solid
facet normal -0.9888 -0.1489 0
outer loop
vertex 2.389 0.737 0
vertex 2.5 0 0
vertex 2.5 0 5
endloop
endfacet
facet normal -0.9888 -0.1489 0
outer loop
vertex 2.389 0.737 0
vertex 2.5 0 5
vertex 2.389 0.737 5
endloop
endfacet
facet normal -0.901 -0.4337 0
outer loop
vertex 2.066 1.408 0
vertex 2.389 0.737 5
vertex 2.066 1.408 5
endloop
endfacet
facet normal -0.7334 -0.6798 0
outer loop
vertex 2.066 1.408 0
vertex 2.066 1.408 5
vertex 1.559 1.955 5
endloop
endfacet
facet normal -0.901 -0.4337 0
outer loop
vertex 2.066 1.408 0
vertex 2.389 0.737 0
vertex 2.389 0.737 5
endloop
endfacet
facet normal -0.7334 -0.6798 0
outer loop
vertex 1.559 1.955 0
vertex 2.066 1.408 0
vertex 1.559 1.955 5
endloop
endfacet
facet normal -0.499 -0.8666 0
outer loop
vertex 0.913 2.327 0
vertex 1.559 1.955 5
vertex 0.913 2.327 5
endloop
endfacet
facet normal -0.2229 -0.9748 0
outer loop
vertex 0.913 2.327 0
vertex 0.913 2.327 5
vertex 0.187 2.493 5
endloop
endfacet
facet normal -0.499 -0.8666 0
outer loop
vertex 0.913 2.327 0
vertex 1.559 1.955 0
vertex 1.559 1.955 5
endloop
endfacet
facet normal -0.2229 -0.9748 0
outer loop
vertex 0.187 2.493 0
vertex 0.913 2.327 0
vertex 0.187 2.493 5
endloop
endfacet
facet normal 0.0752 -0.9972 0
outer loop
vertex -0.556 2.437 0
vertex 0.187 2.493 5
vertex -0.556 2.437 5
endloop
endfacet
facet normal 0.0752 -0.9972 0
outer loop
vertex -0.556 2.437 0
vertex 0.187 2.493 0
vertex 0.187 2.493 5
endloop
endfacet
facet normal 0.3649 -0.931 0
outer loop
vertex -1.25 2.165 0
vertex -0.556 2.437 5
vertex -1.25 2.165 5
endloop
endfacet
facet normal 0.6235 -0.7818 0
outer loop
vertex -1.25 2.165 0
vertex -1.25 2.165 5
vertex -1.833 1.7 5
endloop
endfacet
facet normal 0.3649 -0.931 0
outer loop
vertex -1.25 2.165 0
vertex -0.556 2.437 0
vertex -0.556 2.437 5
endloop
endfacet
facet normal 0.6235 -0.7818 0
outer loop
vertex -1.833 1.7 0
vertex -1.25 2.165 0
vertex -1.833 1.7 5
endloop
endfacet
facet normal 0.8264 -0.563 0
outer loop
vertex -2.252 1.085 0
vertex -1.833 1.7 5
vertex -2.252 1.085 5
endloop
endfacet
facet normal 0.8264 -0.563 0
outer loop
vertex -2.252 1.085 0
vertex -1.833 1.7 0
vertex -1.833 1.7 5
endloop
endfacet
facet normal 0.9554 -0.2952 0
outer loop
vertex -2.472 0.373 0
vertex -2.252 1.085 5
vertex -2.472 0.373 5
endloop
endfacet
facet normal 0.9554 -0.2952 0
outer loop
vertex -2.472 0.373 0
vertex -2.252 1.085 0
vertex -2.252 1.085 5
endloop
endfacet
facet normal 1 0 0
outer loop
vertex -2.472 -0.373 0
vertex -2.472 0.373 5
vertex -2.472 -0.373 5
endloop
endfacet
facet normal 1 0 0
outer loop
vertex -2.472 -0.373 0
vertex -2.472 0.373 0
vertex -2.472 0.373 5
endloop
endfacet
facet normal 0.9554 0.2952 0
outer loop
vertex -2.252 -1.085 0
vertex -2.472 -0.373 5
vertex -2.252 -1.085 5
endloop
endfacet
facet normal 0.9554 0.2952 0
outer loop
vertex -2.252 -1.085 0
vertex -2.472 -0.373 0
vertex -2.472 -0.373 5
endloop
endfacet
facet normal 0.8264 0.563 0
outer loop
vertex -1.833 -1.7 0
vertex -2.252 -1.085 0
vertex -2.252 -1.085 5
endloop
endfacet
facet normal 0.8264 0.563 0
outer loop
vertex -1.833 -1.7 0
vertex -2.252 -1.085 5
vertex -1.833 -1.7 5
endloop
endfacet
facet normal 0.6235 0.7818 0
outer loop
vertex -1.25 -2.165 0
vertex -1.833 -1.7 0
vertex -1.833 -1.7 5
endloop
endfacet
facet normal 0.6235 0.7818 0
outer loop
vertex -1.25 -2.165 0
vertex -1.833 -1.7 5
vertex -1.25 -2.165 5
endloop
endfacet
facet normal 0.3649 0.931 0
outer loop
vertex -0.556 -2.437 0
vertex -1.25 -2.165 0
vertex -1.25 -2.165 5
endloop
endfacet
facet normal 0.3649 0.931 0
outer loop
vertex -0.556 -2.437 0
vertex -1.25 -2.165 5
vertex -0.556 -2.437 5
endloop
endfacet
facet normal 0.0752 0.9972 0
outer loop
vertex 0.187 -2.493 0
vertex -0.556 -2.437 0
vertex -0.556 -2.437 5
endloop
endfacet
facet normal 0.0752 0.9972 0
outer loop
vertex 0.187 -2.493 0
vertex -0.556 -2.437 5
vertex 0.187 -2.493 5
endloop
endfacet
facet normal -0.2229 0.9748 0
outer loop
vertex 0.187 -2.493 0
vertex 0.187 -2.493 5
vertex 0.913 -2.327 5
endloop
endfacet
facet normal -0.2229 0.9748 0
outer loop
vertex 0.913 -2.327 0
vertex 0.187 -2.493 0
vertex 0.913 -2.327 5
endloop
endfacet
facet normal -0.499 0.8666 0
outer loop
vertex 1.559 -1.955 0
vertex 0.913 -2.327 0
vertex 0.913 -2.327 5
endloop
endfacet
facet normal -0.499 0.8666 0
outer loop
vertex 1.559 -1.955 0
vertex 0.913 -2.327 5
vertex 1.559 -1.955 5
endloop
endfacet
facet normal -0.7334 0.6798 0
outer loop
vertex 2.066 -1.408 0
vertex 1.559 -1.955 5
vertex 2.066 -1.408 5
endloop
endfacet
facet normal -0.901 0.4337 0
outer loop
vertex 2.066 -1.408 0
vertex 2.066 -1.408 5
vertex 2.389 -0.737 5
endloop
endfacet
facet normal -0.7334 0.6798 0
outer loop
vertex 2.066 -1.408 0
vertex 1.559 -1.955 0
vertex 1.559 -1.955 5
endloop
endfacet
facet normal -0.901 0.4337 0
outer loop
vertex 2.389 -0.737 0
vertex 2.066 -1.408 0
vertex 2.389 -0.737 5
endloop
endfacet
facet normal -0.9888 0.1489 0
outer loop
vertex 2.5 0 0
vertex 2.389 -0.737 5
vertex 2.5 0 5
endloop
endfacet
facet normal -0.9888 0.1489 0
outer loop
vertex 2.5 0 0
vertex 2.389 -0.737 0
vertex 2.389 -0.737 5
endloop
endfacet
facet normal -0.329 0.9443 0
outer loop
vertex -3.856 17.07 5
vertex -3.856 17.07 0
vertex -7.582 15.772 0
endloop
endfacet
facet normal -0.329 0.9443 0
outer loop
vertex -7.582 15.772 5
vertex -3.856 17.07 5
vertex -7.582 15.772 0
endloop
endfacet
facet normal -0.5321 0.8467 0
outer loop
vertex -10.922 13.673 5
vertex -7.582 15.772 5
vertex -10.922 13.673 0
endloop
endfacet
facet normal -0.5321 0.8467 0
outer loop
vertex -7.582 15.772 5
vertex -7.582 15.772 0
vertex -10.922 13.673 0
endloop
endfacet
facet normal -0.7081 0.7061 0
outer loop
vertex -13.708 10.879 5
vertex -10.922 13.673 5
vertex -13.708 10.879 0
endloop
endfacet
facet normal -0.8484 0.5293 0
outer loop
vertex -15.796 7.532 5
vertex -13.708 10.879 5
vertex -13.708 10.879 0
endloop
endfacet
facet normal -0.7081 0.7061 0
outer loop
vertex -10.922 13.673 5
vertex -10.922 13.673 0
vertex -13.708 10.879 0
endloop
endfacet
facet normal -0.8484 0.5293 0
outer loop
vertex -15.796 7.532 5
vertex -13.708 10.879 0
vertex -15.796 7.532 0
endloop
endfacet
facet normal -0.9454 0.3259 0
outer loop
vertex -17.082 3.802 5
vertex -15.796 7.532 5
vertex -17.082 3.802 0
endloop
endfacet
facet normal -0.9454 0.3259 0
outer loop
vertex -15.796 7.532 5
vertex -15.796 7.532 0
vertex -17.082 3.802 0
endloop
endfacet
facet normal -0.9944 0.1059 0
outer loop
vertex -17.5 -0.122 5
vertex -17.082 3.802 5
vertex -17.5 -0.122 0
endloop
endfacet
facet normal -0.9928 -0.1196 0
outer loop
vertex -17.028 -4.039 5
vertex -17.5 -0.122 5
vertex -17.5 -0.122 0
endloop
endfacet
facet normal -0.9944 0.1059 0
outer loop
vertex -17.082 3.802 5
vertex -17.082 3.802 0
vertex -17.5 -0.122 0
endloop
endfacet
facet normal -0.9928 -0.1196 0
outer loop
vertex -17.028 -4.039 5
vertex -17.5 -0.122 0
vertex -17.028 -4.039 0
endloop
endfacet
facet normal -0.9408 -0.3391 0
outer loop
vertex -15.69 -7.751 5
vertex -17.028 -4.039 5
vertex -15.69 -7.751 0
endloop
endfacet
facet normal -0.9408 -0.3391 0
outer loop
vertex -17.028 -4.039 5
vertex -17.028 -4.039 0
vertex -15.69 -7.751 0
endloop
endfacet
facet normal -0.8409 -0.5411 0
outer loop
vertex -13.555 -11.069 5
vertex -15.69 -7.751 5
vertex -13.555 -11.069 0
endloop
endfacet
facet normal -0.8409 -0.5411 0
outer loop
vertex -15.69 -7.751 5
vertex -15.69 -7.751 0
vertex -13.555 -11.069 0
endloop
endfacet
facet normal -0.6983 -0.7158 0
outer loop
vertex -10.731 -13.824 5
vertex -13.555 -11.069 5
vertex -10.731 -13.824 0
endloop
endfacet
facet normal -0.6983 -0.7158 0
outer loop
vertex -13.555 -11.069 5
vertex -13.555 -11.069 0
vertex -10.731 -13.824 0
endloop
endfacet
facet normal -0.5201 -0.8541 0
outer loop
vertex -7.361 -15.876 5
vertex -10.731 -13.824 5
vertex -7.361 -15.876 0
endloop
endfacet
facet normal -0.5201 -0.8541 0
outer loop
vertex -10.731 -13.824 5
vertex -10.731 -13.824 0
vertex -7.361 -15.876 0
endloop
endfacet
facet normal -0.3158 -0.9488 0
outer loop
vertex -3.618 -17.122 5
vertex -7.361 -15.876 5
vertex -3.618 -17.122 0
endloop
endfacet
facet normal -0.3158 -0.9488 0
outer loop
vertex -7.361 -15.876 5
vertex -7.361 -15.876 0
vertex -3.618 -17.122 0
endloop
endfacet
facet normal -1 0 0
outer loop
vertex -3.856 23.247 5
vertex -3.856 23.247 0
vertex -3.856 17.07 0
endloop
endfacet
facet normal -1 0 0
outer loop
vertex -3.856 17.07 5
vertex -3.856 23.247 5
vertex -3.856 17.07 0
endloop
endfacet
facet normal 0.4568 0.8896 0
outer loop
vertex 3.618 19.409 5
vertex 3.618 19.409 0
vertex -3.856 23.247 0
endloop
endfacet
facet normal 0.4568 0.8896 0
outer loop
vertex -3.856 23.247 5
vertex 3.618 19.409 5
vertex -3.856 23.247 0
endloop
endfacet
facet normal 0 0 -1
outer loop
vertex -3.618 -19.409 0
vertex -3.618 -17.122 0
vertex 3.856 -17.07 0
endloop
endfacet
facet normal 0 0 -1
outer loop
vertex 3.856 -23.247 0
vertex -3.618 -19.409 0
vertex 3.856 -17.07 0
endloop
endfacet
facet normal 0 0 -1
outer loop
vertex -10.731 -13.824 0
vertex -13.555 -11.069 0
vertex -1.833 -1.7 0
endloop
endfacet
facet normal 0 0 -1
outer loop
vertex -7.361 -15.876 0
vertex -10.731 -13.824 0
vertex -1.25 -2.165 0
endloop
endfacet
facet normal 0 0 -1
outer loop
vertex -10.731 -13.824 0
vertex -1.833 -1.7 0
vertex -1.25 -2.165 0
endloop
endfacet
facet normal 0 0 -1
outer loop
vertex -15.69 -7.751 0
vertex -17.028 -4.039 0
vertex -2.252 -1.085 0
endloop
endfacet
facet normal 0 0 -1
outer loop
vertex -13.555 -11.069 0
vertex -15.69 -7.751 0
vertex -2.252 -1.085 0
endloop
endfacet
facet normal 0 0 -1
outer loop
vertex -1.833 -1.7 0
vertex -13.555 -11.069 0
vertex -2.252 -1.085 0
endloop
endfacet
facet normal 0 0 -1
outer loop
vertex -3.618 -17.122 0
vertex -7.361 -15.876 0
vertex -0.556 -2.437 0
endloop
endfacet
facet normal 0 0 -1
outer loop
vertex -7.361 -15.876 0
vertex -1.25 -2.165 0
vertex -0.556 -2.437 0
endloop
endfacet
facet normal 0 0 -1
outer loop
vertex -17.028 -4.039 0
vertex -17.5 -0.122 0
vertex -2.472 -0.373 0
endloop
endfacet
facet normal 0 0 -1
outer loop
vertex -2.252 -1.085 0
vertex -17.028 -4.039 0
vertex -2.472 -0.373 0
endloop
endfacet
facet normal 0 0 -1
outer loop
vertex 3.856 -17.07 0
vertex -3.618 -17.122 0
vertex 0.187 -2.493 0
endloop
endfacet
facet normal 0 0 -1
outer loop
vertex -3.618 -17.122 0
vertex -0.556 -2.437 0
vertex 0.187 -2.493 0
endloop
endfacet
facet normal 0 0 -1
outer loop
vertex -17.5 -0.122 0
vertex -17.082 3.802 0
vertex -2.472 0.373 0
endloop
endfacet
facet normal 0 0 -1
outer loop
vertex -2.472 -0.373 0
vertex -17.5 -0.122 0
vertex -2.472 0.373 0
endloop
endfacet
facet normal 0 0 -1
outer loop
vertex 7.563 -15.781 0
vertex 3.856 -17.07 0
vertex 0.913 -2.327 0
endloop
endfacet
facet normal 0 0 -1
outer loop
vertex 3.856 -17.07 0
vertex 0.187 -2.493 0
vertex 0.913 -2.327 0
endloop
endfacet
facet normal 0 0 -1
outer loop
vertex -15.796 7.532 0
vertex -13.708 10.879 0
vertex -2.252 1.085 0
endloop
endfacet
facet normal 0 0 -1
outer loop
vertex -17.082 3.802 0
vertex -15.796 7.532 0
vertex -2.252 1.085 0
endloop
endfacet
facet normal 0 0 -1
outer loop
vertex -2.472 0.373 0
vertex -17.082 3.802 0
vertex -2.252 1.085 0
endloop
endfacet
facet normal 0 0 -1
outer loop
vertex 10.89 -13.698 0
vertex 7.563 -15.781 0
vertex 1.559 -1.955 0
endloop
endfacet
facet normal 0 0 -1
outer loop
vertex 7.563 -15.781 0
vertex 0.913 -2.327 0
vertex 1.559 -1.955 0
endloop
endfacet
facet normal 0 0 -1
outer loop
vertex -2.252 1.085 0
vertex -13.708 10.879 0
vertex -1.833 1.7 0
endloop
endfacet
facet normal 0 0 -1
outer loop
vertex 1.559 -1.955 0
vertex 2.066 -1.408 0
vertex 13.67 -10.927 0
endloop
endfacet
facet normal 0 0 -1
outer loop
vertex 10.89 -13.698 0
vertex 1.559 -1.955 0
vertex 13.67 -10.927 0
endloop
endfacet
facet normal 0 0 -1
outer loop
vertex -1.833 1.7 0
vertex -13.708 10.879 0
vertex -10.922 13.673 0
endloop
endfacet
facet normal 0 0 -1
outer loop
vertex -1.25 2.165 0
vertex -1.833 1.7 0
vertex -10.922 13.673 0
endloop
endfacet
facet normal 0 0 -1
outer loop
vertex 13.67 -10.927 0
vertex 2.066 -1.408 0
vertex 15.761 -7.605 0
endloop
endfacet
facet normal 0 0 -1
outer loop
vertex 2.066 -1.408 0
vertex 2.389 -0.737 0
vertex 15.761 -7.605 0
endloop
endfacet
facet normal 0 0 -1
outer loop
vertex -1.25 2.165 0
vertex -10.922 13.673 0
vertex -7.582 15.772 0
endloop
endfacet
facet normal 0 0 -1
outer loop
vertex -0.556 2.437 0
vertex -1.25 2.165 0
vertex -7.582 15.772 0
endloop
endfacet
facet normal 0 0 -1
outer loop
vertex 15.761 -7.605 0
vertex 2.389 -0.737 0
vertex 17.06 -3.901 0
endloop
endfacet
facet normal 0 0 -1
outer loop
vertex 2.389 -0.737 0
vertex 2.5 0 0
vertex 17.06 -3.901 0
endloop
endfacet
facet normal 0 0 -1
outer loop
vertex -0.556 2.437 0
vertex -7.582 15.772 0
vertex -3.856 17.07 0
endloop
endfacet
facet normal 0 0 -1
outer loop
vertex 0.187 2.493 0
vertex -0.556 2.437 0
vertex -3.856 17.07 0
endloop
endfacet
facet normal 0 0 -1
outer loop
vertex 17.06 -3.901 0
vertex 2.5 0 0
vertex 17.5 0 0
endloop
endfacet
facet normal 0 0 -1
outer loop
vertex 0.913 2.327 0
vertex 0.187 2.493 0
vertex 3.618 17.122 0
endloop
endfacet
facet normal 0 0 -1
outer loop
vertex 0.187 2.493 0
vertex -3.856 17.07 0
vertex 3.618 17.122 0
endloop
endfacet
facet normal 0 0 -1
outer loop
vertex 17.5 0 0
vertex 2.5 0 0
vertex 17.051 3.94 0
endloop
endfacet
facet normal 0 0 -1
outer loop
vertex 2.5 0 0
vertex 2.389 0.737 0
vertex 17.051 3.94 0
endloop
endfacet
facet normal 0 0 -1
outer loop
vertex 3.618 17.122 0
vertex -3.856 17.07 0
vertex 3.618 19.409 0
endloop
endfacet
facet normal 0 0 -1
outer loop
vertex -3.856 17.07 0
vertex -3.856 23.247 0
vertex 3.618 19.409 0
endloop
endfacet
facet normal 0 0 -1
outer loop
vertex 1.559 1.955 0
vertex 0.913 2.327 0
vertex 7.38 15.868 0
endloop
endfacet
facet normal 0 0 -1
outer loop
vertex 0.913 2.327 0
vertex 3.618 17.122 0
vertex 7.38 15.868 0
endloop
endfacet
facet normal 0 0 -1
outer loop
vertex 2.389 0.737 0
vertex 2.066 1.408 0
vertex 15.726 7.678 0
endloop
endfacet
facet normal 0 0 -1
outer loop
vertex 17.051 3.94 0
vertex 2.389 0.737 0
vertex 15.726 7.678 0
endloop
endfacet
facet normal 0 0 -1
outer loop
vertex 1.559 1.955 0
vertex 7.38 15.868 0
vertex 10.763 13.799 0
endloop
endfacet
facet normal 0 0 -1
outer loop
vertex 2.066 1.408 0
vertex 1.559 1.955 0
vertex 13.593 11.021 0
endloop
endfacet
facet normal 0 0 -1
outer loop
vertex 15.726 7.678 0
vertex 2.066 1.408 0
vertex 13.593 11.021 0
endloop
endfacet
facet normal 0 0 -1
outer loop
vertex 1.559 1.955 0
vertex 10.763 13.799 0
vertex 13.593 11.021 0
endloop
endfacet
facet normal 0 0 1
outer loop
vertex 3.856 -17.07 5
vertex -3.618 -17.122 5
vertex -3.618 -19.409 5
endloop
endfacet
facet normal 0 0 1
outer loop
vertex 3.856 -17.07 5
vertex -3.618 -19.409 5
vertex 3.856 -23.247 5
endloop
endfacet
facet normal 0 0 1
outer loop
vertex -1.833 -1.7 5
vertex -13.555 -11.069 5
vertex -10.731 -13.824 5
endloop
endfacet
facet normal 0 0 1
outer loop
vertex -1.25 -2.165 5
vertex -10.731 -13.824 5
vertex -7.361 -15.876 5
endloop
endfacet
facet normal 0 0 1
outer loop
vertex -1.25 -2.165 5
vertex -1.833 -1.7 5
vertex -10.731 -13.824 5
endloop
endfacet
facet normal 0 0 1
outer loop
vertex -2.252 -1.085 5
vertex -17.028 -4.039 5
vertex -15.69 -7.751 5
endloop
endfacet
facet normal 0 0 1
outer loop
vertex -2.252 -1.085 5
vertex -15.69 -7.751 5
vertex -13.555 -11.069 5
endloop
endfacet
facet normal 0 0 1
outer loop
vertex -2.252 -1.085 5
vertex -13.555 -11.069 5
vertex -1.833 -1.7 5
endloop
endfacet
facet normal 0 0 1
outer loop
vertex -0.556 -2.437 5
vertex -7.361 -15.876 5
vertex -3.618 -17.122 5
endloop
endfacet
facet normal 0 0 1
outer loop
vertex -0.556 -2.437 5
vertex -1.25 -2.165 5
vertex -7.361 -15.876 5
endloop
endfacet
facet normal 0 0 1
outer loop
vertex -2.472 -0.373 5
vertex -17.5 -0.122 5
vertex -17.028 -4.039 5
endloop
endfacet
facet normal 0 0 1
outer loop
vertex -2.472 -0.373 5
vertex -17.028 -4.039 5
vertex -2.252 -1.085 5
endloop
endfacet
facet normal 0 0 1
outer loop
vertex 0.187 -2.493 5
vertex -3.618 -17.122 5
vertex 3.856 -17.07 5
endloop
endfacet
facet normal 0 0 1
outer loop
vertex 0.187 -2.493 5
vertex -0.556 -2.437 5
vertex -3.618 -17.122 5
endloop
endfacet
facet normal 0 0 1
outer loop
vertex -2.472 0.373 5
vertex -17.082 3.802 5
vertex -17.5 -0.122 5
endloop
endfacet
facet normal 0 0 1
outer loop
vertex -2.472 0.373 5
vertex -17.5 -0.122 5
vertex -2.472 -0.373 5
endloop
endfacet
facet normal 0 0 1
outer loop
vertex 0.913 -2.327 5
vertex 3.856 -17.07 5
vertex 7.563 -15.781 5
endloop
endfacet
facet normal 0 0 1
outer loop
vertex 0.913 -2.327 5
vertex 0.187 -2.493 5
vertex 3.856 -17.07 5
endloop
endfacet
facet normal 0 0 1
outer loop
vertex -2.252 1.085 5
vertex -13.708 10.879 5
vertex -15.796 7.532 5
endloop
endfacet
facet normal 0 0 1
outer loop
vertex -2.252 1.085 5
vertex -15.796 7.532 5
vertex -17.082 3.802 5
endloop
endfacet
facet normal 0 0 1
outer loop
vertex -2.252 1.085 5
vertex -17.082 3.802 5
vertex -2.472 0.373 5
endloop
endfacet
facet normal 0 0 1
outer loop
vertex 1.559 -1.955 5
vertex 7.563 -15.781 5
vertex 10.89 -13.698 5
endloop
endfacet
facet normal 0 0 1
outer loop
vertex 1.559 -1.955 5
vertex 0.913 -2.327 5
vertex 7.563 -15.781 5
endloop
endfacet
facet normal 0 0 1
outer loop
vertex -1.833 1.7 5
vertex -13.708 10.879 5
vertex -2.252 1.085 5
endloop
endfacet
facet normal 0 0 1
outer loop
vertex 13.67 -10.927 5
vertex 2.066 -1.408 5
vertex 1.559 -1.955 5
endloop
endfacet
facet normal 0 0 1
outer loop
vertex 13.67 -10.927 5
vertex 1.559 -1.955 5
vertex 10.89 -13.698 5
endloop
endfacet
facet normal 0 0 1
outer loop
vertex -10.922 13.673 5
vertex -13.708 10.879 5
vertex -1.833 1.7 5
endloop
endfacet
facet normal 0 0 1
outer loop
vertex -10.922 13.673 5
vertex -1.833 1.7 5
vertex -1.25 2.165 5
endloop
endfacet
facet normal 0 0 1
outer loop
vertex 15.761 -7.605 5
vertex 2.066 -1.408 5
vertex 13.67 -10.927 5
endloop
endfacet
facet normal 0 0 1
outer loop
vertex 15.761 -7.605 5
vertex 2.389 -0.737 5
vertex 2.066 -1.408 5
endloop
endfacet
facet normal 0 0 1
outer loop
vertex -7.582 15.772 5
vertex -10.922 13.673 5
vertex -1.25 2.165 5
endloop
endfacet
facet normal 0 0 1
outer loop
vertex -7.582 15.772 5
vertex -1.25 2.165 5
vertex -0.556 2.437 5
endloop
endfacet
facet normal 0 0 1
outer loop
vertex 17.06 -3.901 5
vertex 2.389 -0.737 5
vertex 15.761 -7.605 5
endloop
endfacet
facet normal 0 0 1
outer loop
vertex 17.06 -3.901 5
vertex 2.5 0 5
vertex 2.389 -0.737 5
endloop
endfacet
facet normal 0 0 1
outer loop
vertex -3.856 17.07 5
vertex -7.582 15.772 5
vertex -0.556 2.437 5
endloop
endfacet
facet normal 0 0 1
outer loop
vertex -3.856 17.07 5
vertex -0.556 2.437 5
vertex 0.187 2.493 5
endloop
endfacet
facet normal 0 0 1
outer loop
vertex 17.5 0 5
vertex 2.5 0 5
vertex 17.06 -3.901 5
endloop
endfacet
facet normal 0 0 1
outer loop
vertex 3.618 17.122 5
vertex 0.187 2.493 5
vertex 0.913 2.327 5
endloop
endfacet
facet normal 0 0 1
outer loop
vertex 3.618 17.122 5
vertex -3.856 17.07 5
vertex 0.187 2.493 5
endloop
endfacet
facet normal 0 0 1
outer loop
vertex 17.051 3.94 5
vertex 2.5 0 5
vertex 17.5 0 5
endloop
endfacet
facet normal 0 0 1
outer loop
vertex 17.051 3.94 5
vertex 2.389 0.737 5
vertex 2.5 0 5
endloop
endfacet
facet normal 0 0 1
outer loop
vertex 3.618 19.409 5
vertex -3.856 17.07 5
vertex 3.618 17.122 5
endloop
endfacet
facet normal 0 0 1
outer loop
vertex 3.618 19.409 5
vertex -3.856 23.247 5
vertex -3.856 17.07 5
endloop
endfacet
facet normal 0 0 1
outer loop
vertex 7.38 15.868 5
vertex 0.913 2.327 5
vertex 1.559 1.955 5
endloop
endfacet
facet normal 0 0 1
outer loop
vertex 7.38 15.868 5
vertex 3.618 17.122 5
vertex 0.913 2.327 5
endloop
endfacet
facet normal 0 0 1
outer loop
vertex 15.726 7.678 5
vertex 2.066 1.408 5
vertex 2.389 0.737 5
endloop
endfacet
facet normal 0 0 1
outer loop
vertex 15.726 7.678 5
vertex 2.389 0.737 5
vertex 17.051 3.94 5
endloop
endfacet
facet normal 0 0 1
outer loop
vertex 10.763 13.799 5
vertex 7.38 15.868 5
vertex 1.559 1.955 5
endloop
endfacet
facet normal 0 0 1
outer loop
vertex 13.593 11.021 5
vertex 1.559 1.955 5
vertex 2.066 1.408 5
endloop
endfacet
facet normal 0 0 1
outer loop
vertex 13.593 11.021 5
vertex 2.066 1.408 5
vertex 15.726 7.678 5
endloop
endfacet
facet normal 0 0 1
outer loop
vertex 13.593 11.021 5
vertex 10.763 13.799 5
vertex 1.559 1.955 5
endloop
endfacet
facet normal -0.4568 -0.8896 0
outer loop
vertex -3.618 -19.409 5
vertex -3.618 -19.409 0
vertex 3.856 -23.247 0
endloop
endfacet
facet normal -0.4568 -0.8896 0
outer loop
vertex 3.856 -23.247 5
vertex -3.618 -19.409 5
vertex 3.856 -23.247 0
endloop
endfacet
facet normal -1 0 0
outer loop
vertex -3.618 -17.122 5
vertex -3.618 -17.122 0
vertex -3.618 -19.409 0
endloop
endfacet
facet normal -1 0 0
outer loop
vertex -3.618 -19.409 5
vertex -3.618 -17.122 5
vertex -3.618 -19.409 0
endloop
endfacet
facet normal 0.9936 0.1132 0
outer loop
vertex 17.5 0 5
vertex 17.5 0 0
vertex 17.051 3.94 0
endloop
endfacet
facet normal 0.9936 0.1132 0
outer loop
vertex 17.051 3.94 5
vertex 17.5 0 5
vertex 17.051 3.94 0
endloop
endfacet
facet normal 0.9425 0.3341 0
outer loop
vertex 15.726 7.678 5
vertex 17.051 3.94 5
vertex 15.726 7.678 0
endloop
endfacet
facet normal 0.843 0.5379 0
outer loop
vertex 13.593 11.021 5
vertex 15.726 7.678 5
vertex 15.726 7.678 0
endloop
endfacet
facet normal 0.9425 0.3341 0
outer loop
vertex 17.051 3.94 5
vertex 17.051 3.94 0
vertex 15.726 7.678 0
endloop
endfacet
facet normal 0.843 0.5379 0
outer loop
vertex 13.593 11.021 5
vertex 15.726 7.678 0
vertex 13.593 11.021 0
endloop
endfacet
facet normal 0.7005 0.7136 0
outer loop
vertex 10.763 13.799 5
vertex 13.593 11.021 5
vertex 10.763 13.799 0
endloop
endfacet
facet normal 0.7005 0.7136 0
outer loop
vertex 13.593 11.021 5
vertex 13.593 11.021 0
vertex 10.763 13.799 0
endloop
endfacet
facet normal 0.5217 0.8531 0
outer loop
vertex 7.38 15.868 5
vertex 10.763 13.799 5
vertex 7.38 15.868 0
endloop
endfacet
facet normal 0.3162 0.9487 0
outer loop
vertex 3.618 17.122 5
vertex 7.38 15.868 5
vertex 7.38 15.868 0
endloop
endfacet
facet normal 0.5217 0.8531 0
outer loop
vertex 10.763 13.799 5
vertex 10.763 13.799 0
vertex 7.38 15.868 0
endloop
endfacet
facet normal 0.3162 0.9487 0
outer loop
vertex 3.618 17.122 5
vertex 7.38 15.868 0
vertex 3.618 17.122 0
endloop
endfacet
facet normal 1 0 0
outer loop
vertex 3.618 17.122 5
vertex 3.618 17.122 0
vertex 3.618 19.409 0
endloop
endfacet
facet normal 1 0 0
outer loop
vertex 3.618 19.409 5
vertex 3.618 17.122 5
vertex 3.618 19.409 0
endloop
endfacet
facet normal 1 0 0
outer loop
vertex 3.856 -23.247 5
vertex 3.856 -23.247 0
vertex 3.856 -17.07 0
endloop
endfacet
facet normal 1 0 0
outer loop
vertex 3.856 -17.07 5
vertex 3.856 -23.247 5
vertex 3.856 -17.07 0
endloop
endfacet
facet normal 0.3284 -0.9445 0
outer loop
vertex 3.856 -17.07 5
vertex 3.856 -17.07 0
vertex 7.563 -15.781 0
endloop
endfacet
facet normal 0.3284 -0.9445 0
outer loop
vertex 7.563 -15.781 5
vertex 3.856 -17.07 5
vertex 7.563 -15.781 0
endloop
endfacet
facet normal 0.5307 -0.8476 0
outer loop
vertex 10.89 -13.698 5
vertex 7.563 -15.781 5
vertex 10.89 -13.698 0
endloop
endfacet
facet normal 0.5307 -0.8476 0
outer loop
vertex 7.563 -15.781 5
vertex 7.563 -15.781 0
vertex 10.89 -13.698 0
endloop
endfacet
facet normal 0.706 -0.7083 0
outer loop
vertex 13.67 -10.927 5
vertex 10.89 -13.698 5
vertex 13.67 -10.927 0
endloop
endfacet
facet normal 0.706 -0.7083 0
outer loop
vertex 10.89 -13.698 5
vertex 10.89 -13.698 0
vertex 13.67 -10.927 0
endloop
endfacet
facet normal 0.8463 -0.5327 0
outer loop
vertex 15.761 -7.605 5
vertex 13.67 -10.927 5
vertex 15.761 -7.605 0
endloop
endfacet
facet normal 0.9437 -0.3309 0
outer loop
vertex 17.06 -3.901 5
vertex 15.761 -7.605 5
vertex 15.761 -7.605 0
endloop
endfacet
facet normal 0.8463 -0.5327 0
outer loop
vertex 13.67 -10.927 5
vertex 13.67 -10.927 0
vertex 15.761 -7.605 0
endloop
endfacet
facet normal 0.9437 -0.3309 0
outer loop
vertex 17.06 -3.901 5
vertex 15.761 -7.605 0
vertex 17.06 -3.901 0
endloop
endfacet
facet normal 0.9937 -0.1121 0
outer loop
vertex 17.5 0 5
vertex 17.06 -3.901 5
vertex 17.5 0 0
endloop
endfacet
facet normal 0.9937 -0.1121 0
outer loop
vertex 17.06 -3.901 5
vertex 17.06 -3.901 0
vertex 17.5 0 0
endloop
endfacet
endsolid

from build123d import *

# Parameters (mm, degrees)
F0_R     = 2.5
F1_DEPTH = 5


with BuildPart() as f1:
    # F0 (on Top) → F1 (new body)
    with BuildSketch(Plane.XY):
        with BuildLine():
            ThreePointArc((3.855527, -17.07), (13.669706, -10.926534), (17.5, 0))
            ThreePointArc((17.5, 0), (13.593381, 11.021343), (3.617714, 17.121978))
            ThreePointArc((3.617714, 17.121978), (-0.121713, 17.499577), (-3.855527, 17.07))
            ThreePointArc((-3.855527, 17.07), (-17.499577, -0.121713), (-3.617714, -17.121978))
            ThreePointArc((-3.617714, -17.121978), (0.121713, -17.499577), (3.855527, -17.07))
        make_face()
        Circle(F0_R, mode=Mode.SUBTRACT)
        with BuildLine():
            ThreePointArc((-3.855527, 17.07), (-0.121713, 17.499577), (3.617714, 17.121978))
            Line((3.617714, 17.121978), (3.617714, 19.408765))
            Line((3.617714, 19.408765), (-3.855527, 23.246588))
            Line((-3.855527, 23.246588), (-3.855527, 17.07))
        make_face()
        with BuildLine():
            Line((3.855527, -23.246588), (3.855527, -17.07))
            ThreePointArc((3.855527, -17.07), (0.121713, -17.499577), (-3.617714, -17.121978))
            Line((-3.617714, -17.121978), (-3.617714, -19.408765))
            Line((-3.617714, -19.408765), (3.855527, -23.246588))
        make_face()
    extrude(amount=F1_DEPTH)


solid = f1.part
